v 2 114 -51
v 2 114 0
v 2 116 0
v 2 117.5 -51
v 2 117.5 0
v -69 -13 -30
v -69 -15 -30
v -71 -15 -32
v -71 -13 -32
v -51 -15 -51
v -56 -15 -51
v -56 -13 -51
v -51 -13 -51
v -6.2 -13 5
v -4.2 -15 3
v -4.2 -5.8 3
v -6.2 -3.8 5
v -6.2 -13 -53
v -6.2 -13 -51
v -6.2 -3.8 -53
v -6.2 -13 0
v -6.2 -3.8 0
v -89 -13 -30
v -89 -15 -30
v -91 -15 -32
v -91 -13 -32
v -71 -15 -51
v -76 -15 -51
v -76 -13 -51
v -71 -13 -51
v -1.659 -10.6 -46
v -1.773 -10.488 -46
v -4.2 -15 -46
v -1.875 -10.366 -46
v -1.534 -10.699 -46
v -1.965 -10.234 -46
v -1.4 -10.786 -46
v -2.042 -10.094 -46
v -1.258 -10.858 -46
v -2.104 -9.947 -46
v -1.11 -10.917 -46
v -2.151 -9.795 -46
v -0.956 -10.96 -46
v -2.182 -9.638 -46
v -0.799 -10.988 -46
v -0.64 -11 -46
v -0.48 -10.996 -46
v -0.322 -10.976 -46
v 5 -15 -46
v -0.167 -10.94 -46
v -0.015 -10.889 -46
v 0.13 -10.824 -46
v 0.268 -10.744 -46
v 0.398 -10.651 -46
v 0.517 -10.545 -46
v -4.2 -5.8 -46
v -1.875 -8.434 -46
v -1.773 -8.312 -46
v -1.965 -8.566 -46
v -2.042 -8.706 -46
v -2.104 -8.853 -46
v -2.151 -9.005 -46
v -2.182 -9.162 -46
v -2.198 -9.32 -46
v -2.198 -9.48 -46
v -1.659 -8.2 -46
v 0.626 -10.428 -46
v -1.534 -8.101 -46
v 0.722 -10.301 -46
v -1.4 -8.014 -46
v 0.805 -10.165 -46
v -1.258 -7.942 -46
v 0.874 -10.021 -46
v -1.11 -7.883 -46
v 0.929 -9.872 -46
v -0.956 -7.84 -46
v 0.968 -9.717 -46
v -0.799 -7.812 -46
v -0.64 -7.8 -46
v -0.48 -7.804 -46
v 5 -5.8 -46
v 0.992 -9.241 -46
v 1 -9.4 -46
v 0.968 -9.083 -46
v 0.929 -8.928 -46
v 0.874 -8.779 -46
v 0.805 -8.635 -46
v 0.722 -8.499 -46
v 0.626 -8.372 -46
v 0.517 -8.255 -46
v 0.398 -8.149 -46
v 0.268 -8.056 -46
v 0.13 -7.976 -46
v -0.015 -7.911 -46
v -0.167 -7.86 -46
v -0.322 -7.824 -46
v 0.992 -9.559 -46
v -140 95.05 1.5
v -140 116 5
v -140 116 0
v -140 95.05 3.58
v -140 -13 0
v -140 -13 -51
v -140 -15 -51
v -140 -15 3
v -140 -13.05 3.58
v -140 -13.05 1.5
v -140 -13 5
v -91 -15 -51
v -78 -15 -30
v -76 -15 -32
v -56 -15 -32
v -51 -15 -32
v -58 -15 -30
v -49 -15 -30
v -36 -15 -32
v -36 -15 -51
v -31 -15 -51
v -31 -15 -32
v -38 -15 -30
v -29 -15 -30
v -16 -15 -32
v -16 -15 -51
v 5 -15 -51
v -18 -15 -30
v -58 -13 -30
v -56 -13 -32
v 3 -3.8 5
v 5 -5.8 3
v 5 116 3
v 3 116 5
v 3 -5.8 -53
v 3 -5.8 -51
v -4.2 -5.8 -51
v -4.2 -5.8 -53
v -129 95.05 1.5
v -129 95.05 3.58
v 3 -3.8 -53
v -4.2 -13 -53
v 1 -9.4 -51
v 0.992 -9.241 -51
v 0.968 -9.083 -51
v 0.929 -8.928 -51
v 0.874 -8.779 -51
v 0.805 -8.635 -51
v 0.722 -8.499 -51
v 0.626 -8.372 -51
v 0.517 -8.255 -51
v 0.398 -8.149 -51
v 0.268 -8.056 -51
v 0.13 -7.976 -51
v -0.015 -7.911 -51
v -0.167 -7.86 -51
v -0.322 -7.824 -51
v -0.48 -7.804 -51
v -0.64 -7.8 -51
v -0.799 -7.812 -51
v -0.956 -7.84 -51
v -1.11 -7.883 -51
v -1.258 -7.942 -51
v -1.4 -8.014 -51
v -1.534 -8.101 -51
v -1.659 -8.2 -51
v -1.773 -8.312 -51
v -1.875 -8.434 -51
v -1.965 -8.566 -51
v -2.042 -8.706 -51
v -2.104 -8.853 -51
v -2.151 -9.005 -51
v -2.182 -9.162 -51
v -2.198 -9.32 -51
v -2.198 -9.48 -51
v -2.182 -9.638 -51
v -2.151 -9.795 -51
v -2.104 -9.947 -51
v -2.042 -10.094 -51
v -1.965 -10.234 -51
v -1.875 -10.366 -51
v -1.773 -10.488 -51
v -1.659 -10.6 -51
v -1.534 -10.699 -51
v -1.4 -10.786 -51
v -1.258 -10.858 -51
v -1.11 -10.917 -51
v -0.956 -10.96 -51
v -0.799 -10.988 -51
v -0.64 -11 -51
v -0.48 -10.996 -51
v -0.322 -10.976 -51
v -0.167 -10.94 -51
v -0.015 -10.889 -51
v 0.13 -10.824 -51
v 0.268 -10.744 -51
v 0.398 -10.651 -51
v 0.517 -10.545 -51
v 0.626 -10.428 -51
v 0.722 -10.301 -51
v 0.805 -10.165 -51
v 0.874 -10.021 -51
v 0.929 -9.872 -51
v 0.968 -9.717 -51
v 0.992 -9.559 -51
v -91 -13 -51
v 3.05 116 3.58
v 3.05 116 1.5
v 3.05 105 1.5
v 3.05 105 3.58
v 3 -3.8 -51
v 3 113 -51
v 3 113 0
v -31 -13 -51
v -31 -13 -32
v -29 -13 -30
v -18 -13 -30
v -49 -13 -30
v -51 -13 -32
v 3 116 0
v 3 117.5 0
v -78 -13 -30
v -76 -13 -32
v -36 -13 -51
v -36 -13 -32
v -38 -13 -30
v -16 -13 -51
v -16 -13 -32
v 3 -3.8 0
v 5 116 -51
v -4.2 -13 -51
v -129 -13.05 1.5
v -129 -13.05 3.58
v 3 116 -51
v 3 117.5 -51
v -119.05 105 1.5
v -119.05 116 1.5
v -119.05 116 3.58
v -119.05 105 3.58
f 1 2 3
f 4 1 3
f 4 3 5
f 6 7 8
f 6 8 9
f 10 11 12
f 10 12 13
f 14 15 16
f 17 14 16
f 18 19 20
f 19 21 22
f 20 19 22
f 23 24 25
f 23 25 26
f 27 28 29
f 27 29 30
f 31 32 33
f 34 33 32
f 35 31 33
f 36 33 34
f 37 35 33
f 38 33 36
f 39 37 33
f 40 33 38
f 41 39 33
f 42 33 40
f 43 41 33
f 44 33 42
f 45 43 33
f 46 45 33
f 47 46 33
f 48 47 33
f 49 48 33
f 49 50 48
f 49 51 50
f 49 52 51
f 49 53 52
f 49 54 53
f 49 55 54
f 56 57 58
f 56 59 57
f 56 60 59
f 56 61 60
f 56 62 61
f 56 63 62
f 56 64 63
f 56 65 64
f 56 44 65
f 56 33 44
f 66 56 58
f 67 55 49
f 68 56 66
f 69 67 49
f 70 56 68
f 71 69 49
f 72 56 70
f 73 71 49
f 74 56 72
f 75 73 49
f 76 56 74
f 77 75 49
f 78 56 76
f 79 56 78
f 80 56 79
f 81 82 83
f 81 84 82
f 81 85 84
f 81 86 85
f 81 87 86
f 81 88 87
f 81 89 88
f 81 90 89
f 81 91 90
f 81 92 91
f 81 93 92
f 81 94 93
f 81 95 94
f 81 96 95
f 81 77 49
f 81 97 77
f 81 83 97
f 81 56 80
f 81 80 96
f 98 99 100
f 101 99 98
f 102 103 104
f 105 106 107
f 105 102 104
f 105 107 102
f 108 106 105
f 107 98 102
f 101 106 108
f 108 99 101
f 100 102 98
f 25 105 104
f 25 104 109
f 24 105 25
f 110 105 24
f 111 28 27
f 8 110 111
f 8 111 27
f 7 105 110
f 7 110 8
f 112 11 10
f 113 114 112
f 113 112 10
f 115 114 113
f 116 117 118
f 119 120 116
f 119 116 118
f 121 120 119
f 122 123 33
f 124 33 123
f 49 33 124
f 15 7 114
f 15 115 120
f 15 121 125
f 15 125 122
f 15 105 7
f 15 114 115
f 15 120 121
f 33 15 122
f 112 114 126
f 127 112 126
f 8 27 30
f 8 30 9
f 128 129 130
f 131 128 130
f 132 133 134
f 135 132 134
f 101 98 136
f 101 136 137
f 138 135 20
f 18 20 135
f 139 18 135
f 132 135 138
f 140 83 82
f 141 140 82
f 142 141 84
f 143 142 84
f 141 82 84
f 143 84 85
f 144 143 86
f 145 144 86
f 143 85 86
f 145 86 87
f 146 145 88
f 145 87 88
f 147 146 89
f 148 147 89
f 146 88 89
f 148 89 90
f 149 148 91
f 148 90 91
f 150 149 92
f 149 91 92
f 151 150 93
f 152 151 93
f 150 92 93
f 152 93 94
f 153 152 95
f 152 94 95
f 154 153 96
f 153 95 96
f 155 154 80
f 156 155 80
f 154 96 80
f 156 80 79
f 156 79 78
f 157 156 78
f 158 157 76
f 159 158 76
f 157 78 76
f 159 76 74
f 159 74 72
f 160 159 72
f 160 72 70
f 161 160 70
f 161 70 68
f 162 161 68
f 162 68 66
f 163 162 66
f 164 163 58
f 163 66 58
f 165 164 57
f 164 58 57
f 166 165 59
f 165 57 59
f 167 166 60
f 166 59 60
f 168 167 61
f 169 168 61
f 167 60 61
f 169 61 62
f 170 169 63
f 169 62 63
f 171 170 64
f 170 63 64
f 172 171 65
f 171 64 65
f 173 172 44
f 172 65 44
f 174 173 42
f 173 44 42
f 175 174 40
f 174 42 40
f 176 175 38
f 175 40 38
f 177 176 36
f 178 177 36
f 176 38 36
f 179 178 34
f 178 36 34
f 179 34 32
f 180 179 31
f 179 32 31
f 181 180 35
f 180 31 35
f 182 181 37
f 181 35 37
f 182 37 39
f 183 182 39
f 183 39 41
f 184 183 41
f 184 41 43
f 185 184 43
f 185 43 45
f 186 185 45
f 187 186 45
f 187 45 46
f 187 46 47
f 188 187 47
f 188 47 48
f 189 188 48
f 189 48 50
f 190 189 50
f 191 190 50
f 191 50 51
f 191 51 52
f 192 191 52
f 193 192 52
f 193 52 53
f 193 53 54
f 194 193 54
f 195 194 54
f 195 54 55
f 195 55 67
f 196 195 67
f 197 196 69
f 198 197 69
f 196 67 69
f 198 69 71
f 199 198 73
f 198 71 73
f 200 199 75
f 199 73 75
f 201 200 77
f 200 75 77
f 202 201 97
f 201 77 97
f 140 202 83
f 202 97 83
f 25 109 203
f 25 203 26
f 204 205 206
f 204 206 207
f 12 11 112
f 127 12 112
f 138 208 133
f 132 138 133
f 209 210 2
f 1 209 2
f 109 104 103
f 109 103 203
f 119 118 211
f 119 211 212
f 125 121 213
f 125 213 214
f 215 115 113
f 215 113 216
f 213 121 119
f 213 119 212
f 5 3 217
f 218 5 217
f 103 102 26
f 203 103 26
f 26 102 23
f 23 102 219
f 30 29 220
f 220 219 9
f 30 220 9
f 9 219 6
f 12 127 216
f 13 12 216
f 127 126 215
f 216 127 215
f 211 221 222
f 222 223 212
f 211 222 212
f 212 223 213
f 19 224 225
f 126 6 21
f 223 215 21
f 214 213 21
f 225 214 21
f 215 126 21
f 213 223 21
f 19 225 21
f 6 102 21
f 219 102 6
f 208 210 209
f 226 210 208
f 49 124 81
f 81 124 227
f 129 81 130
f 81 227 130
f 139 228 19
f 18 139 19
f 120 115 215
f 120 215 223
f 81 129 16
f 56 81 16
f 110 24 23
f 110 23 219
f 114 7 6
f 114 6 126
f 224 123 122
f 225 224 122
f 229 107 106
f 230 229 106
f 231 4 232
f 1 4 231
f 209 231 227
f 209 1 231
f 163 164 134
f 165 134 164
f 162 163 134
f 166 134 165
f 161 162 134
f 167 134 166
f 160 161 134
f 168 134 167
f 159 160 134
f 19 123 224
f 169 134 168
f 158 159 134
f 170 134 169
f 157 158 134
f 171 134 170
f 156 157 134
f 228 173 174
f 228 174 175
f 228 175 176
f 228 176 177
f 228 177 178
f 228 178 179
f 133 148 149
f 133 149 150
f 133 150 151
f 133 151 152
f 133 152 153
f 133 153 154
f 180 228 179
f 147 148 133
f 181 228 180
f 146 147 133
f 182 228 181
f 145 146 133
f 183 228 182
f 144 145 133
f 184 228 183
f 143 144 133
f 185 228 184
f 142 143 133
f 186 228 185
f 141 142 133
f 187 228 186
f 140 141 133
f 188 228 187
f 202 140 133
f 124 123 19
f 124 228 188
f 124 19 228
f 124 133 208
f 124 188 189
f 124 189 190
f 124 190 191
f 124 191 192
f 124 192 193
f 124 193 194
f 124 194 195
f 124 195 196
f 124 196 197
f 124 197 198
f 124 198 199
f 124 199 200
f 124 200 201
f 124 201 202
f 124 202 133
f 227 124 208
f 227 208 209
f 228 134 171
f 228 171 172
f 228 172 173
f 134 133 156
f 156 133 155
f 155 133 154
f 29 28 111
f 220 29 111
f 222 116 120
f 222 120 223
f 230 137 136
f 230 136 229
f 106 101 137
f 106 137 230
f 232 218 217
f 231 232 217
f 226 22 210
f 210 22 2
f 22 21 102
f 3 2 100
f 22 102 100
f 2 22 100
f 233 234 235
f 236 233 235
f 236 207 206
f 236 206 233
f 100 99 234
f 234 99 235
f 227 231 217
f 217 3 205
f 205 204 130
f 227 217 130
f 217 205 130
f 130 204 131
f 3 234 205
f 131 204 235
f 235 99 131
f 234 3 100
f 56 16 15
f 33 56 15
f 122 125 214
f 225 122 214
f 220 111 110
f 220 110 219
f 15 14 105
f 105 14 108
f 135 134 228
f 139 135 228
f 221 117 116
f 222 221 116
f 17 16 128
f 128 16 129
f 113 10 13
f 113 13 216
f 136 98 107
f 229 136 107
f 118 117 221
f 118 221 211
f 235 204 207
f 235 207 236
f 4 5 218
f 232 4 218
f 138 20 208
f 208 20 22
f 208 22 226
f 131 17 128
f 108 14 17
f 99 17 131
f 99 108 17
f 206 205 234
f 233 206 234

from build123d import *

# Parameters (mm, degrees)
SKETCH_1_W      = 140
SKETCH_1_H      = 116
PAD_DEPTH       = 5
SKETCH_W        = 140
SKETCH_H        = 15
PAD001_DEPTH    = 5
SKETCH001_W     = 131
SKETCH001_H     = 5
PAD002_DEPTH    = 5
SKETCH002_W     = 9.2
SKETCH002_H     = 9.2
POCKET_DEPTH    = 5
SKETCH003_W     = 102.8
SKETCH003_H     = 2
PAD003_DEPTH    = 51
SKETCH004_W     = 2
SKETCH004_H     = 121.8
PAD004_DEPTH    = 51
PAD005_DEPTH    = 53
SKETCH006_W     = 15
SKETCH006_H     = 41
POCKET001_DEPTH = 2
SKETCH007_W     = 9.2
SKETCH007_H     = 5
PAD006_DEPTH    = 9.2
SKETCH008_R     = 1.6
POCKET002_DEPTH = 5
SKETCH009_W     = 33
SKETCH009_H     = 2
PAD007_DEPTH    = 51
SKETCH010_W     = 108.1
SKETCH010_H     = 2.08
POCKET003_DEPTH = 11
SKETCH011_W     = 122.1
SKETCH011_H     = 2.08
POCKET004_DEPTH = 11
CHAMFER_SIZE    = 2
PAD008_DEPTH    = 51
CHAMFER001_SIZE = 2


with BuildPart() as part:
    # Sketch_1 → Pad (new body)
    with BuildSketch(Plane.XY):
        with Locations((-70, 58)):
            Rectangle(SKETCH_1_W, SKETCH_1_H)
    extrude(amount=PAD_DEPTH)

    # Sketch → Pad001 (join)
    with BuildSketch(Plane.XY):
        with Locations((-70, -7.5)):
            Rectangle(SKETCH_W, SKETCH_H)
    extrude(amount=PAD001_DEPTH)

    # Sketch001 (on Face9 of Pad001) → Pad002 (join)
    with BuildSketch(Plane.YZ):
        with Locations((50.5, 2.5)):
            Rectangle(SKETCH001_W, SKETCH001_H)
    extrude(amount=PAD002_DEPTH)

    # Sketch002 (on Face11 of Pad002) → Pocket (cut)
    with BuildSketch(Plane.XY.offset(5)):
        with Locations((0.4, -10.4)):
            Rectangle(SKETCH002_W, SKETCH002_H)
    extrude(amount=-POCKET_DEPTH, mode=Mode.SUBTRACT)

    # Sketch003 (on Face7 of Pocket) → Pad003 (join)
    with BuildSketch(Plane(origin=(0, 0, 0), x_dir=(1, 0, 0), z_dir=(0, 0, -1))):
        with Locations((-55.6, 14)):
            Rectangle(SKETCH003_W, SKETCH003_H)
    extrude(amount=PAD003_DEPTH)

    # Sketch004 (on Face10 of Pad003) → Pad004 (join)
    with BuildSketch(Plane(origin=(0, 0, 0), x_dir=(1, 0, 0), z_dir=(0, 0, -1))):
        with Locations((4, -55.1)):
            Rectangle(SKETCH004_W, SKETCH004_H)
    extrude(amount=PAD004_DEPTH)

    # Sketch005 (on Face7 of Pad004) → Pad005 (join)
    with BuildSketch(Plane(origin=(0, 0, 0), x_dir=(1, 0, 0), z_dir=(0, 0, -1))):
        Polygon((-4.2, 13), (-6.2, 13), (-6.2, 3.8), (3, 3.8), (3, 5.8), (-4.2, 5.8), align=None)
    extrude(amount=PAD005_DEPTH)

    # Sketch006 (on Face12 of Pad005) → Pocket001 (cut)
    with BuildSketch(Plane.XZ.offset(15)):
        with Locations((-23.5, -50.5)):
            Rectangle(SKETCH006_W, SKETCH006_H)
        with Locations((-43.5, -50.5)):
            Rectangle(SKETCH006_W, SKETCH006_H)
        with Locations((-63.5, -50.5)):
            Rectangle(SKETCH006_W, SKETCH006_H)
        with Locations((-83.5, -50.5)):
            Rectangle(SKETCH006_W, SKETCH006_H)
    extrude(amount=-POCKET001_DEPTH, mode=Mode.SUBTRACT)

    # Sketch007 (on Face44 of Pocket001) → Pad006 (join)
    with BuildSketch(Plane.XZ.offset(5.8)):
        with Locations((0.4, -48.5)):
            Rectangle(SKETCH007_W, SKETCH007_H)
    extrude(amount=PAD006_DEPTH)

    # Sketch008 (on Face50 of Pad006) → Pocket002 (cut)
    with BuildSketch(Plane.XY.offset(-46)):
        with Locations((-0.6, -9.4)):
            Circle(SKETCH008_R)
    extrude(amount=-POCKET002_DEPTH, mode=Mode.SUBTRACT)

    # Sketch009 (on Face7 of Pocket002) → Pad007 (join)
    with BuildSketch(Plane(origin=(0, 0, 0), x_dir=(1, 0, 0), z_dir=(0, 0, -1))):
        with Locations((-123.5, 14)):
            Rectangle(SKETCH009_W, SKETCH009_H)
    extrude(amount=PAD007_DEPTH)

    # Sketch010 (on Face1 of Pad007) → Pocket003 (cut)
    with BuildSketch(Plane(origin=(-140, 0, 0), x_dir=(0, -1, 0), z_dir=(-1, 0, 0))):
        with Locations((-41, 2.54)):
            Rectangle(SKETCH010_W, SKETCH010_H)
    extrude(amount=-POCKET003_DEPTH, mode=Mode.SUBTRACT)

    # Sketch011 (on Face3 of Pocket003) → Pocket004 (cut)
    with BuildSketch(Plane(origin=(0, 116, 0), x_dir=(-1, 0, 0), z_dir=(0, 1, 0))):
        with Locations((58, 2.54)):
            Rectangle(SKETCH011_W, SKETCH011_H)
    extrude(amount=-POCKET004_DEPTH, mode=Mode.SUBTRACT)

    # Chamfer
    chamfer_edges = [part.edges().sort_by_distance(p)[0] for p in [
        (-72.1, -15, 5),
        (-4.2, -10.4, 5),
        (-2.1, -5.8, 5),
        (2.5, -5.8, 5),
        (5, 55.1, 5),
    ]]
    chamfer(chamfer_edges, length=CHAMFER_SIZE)

    # Sketch012 (on Face23 of Chamfer) → Pad008 (join)
    with BuildSketch(Plane(origin=(0, 0, 0), x_dir=(1, 0, 0), z_dir=(0, 0, -1))):
        Polygon((2, -114), (2, -117.5), (3, -117.5), (3, -114), (3, -113), align=None)
    extrude(amount=PAD008_DEPTH)

    # Chamfer001
    chamfer001_edges = [part.edges().sort_by_distance(p)[0] for p in [
        (-91, -14, -30),
        (-76, -14, -30),
        (-71, -14, -30),
        (-56, -14, -30),
        (-51, -14, -30),
        (-36, -14, -30),
        (-31, -14, -30),
        (-16, -14, -30),
    ]]
    chamfer(chamfer001_edges, length=CHAMFER001_SIZE)


solid = part.part
